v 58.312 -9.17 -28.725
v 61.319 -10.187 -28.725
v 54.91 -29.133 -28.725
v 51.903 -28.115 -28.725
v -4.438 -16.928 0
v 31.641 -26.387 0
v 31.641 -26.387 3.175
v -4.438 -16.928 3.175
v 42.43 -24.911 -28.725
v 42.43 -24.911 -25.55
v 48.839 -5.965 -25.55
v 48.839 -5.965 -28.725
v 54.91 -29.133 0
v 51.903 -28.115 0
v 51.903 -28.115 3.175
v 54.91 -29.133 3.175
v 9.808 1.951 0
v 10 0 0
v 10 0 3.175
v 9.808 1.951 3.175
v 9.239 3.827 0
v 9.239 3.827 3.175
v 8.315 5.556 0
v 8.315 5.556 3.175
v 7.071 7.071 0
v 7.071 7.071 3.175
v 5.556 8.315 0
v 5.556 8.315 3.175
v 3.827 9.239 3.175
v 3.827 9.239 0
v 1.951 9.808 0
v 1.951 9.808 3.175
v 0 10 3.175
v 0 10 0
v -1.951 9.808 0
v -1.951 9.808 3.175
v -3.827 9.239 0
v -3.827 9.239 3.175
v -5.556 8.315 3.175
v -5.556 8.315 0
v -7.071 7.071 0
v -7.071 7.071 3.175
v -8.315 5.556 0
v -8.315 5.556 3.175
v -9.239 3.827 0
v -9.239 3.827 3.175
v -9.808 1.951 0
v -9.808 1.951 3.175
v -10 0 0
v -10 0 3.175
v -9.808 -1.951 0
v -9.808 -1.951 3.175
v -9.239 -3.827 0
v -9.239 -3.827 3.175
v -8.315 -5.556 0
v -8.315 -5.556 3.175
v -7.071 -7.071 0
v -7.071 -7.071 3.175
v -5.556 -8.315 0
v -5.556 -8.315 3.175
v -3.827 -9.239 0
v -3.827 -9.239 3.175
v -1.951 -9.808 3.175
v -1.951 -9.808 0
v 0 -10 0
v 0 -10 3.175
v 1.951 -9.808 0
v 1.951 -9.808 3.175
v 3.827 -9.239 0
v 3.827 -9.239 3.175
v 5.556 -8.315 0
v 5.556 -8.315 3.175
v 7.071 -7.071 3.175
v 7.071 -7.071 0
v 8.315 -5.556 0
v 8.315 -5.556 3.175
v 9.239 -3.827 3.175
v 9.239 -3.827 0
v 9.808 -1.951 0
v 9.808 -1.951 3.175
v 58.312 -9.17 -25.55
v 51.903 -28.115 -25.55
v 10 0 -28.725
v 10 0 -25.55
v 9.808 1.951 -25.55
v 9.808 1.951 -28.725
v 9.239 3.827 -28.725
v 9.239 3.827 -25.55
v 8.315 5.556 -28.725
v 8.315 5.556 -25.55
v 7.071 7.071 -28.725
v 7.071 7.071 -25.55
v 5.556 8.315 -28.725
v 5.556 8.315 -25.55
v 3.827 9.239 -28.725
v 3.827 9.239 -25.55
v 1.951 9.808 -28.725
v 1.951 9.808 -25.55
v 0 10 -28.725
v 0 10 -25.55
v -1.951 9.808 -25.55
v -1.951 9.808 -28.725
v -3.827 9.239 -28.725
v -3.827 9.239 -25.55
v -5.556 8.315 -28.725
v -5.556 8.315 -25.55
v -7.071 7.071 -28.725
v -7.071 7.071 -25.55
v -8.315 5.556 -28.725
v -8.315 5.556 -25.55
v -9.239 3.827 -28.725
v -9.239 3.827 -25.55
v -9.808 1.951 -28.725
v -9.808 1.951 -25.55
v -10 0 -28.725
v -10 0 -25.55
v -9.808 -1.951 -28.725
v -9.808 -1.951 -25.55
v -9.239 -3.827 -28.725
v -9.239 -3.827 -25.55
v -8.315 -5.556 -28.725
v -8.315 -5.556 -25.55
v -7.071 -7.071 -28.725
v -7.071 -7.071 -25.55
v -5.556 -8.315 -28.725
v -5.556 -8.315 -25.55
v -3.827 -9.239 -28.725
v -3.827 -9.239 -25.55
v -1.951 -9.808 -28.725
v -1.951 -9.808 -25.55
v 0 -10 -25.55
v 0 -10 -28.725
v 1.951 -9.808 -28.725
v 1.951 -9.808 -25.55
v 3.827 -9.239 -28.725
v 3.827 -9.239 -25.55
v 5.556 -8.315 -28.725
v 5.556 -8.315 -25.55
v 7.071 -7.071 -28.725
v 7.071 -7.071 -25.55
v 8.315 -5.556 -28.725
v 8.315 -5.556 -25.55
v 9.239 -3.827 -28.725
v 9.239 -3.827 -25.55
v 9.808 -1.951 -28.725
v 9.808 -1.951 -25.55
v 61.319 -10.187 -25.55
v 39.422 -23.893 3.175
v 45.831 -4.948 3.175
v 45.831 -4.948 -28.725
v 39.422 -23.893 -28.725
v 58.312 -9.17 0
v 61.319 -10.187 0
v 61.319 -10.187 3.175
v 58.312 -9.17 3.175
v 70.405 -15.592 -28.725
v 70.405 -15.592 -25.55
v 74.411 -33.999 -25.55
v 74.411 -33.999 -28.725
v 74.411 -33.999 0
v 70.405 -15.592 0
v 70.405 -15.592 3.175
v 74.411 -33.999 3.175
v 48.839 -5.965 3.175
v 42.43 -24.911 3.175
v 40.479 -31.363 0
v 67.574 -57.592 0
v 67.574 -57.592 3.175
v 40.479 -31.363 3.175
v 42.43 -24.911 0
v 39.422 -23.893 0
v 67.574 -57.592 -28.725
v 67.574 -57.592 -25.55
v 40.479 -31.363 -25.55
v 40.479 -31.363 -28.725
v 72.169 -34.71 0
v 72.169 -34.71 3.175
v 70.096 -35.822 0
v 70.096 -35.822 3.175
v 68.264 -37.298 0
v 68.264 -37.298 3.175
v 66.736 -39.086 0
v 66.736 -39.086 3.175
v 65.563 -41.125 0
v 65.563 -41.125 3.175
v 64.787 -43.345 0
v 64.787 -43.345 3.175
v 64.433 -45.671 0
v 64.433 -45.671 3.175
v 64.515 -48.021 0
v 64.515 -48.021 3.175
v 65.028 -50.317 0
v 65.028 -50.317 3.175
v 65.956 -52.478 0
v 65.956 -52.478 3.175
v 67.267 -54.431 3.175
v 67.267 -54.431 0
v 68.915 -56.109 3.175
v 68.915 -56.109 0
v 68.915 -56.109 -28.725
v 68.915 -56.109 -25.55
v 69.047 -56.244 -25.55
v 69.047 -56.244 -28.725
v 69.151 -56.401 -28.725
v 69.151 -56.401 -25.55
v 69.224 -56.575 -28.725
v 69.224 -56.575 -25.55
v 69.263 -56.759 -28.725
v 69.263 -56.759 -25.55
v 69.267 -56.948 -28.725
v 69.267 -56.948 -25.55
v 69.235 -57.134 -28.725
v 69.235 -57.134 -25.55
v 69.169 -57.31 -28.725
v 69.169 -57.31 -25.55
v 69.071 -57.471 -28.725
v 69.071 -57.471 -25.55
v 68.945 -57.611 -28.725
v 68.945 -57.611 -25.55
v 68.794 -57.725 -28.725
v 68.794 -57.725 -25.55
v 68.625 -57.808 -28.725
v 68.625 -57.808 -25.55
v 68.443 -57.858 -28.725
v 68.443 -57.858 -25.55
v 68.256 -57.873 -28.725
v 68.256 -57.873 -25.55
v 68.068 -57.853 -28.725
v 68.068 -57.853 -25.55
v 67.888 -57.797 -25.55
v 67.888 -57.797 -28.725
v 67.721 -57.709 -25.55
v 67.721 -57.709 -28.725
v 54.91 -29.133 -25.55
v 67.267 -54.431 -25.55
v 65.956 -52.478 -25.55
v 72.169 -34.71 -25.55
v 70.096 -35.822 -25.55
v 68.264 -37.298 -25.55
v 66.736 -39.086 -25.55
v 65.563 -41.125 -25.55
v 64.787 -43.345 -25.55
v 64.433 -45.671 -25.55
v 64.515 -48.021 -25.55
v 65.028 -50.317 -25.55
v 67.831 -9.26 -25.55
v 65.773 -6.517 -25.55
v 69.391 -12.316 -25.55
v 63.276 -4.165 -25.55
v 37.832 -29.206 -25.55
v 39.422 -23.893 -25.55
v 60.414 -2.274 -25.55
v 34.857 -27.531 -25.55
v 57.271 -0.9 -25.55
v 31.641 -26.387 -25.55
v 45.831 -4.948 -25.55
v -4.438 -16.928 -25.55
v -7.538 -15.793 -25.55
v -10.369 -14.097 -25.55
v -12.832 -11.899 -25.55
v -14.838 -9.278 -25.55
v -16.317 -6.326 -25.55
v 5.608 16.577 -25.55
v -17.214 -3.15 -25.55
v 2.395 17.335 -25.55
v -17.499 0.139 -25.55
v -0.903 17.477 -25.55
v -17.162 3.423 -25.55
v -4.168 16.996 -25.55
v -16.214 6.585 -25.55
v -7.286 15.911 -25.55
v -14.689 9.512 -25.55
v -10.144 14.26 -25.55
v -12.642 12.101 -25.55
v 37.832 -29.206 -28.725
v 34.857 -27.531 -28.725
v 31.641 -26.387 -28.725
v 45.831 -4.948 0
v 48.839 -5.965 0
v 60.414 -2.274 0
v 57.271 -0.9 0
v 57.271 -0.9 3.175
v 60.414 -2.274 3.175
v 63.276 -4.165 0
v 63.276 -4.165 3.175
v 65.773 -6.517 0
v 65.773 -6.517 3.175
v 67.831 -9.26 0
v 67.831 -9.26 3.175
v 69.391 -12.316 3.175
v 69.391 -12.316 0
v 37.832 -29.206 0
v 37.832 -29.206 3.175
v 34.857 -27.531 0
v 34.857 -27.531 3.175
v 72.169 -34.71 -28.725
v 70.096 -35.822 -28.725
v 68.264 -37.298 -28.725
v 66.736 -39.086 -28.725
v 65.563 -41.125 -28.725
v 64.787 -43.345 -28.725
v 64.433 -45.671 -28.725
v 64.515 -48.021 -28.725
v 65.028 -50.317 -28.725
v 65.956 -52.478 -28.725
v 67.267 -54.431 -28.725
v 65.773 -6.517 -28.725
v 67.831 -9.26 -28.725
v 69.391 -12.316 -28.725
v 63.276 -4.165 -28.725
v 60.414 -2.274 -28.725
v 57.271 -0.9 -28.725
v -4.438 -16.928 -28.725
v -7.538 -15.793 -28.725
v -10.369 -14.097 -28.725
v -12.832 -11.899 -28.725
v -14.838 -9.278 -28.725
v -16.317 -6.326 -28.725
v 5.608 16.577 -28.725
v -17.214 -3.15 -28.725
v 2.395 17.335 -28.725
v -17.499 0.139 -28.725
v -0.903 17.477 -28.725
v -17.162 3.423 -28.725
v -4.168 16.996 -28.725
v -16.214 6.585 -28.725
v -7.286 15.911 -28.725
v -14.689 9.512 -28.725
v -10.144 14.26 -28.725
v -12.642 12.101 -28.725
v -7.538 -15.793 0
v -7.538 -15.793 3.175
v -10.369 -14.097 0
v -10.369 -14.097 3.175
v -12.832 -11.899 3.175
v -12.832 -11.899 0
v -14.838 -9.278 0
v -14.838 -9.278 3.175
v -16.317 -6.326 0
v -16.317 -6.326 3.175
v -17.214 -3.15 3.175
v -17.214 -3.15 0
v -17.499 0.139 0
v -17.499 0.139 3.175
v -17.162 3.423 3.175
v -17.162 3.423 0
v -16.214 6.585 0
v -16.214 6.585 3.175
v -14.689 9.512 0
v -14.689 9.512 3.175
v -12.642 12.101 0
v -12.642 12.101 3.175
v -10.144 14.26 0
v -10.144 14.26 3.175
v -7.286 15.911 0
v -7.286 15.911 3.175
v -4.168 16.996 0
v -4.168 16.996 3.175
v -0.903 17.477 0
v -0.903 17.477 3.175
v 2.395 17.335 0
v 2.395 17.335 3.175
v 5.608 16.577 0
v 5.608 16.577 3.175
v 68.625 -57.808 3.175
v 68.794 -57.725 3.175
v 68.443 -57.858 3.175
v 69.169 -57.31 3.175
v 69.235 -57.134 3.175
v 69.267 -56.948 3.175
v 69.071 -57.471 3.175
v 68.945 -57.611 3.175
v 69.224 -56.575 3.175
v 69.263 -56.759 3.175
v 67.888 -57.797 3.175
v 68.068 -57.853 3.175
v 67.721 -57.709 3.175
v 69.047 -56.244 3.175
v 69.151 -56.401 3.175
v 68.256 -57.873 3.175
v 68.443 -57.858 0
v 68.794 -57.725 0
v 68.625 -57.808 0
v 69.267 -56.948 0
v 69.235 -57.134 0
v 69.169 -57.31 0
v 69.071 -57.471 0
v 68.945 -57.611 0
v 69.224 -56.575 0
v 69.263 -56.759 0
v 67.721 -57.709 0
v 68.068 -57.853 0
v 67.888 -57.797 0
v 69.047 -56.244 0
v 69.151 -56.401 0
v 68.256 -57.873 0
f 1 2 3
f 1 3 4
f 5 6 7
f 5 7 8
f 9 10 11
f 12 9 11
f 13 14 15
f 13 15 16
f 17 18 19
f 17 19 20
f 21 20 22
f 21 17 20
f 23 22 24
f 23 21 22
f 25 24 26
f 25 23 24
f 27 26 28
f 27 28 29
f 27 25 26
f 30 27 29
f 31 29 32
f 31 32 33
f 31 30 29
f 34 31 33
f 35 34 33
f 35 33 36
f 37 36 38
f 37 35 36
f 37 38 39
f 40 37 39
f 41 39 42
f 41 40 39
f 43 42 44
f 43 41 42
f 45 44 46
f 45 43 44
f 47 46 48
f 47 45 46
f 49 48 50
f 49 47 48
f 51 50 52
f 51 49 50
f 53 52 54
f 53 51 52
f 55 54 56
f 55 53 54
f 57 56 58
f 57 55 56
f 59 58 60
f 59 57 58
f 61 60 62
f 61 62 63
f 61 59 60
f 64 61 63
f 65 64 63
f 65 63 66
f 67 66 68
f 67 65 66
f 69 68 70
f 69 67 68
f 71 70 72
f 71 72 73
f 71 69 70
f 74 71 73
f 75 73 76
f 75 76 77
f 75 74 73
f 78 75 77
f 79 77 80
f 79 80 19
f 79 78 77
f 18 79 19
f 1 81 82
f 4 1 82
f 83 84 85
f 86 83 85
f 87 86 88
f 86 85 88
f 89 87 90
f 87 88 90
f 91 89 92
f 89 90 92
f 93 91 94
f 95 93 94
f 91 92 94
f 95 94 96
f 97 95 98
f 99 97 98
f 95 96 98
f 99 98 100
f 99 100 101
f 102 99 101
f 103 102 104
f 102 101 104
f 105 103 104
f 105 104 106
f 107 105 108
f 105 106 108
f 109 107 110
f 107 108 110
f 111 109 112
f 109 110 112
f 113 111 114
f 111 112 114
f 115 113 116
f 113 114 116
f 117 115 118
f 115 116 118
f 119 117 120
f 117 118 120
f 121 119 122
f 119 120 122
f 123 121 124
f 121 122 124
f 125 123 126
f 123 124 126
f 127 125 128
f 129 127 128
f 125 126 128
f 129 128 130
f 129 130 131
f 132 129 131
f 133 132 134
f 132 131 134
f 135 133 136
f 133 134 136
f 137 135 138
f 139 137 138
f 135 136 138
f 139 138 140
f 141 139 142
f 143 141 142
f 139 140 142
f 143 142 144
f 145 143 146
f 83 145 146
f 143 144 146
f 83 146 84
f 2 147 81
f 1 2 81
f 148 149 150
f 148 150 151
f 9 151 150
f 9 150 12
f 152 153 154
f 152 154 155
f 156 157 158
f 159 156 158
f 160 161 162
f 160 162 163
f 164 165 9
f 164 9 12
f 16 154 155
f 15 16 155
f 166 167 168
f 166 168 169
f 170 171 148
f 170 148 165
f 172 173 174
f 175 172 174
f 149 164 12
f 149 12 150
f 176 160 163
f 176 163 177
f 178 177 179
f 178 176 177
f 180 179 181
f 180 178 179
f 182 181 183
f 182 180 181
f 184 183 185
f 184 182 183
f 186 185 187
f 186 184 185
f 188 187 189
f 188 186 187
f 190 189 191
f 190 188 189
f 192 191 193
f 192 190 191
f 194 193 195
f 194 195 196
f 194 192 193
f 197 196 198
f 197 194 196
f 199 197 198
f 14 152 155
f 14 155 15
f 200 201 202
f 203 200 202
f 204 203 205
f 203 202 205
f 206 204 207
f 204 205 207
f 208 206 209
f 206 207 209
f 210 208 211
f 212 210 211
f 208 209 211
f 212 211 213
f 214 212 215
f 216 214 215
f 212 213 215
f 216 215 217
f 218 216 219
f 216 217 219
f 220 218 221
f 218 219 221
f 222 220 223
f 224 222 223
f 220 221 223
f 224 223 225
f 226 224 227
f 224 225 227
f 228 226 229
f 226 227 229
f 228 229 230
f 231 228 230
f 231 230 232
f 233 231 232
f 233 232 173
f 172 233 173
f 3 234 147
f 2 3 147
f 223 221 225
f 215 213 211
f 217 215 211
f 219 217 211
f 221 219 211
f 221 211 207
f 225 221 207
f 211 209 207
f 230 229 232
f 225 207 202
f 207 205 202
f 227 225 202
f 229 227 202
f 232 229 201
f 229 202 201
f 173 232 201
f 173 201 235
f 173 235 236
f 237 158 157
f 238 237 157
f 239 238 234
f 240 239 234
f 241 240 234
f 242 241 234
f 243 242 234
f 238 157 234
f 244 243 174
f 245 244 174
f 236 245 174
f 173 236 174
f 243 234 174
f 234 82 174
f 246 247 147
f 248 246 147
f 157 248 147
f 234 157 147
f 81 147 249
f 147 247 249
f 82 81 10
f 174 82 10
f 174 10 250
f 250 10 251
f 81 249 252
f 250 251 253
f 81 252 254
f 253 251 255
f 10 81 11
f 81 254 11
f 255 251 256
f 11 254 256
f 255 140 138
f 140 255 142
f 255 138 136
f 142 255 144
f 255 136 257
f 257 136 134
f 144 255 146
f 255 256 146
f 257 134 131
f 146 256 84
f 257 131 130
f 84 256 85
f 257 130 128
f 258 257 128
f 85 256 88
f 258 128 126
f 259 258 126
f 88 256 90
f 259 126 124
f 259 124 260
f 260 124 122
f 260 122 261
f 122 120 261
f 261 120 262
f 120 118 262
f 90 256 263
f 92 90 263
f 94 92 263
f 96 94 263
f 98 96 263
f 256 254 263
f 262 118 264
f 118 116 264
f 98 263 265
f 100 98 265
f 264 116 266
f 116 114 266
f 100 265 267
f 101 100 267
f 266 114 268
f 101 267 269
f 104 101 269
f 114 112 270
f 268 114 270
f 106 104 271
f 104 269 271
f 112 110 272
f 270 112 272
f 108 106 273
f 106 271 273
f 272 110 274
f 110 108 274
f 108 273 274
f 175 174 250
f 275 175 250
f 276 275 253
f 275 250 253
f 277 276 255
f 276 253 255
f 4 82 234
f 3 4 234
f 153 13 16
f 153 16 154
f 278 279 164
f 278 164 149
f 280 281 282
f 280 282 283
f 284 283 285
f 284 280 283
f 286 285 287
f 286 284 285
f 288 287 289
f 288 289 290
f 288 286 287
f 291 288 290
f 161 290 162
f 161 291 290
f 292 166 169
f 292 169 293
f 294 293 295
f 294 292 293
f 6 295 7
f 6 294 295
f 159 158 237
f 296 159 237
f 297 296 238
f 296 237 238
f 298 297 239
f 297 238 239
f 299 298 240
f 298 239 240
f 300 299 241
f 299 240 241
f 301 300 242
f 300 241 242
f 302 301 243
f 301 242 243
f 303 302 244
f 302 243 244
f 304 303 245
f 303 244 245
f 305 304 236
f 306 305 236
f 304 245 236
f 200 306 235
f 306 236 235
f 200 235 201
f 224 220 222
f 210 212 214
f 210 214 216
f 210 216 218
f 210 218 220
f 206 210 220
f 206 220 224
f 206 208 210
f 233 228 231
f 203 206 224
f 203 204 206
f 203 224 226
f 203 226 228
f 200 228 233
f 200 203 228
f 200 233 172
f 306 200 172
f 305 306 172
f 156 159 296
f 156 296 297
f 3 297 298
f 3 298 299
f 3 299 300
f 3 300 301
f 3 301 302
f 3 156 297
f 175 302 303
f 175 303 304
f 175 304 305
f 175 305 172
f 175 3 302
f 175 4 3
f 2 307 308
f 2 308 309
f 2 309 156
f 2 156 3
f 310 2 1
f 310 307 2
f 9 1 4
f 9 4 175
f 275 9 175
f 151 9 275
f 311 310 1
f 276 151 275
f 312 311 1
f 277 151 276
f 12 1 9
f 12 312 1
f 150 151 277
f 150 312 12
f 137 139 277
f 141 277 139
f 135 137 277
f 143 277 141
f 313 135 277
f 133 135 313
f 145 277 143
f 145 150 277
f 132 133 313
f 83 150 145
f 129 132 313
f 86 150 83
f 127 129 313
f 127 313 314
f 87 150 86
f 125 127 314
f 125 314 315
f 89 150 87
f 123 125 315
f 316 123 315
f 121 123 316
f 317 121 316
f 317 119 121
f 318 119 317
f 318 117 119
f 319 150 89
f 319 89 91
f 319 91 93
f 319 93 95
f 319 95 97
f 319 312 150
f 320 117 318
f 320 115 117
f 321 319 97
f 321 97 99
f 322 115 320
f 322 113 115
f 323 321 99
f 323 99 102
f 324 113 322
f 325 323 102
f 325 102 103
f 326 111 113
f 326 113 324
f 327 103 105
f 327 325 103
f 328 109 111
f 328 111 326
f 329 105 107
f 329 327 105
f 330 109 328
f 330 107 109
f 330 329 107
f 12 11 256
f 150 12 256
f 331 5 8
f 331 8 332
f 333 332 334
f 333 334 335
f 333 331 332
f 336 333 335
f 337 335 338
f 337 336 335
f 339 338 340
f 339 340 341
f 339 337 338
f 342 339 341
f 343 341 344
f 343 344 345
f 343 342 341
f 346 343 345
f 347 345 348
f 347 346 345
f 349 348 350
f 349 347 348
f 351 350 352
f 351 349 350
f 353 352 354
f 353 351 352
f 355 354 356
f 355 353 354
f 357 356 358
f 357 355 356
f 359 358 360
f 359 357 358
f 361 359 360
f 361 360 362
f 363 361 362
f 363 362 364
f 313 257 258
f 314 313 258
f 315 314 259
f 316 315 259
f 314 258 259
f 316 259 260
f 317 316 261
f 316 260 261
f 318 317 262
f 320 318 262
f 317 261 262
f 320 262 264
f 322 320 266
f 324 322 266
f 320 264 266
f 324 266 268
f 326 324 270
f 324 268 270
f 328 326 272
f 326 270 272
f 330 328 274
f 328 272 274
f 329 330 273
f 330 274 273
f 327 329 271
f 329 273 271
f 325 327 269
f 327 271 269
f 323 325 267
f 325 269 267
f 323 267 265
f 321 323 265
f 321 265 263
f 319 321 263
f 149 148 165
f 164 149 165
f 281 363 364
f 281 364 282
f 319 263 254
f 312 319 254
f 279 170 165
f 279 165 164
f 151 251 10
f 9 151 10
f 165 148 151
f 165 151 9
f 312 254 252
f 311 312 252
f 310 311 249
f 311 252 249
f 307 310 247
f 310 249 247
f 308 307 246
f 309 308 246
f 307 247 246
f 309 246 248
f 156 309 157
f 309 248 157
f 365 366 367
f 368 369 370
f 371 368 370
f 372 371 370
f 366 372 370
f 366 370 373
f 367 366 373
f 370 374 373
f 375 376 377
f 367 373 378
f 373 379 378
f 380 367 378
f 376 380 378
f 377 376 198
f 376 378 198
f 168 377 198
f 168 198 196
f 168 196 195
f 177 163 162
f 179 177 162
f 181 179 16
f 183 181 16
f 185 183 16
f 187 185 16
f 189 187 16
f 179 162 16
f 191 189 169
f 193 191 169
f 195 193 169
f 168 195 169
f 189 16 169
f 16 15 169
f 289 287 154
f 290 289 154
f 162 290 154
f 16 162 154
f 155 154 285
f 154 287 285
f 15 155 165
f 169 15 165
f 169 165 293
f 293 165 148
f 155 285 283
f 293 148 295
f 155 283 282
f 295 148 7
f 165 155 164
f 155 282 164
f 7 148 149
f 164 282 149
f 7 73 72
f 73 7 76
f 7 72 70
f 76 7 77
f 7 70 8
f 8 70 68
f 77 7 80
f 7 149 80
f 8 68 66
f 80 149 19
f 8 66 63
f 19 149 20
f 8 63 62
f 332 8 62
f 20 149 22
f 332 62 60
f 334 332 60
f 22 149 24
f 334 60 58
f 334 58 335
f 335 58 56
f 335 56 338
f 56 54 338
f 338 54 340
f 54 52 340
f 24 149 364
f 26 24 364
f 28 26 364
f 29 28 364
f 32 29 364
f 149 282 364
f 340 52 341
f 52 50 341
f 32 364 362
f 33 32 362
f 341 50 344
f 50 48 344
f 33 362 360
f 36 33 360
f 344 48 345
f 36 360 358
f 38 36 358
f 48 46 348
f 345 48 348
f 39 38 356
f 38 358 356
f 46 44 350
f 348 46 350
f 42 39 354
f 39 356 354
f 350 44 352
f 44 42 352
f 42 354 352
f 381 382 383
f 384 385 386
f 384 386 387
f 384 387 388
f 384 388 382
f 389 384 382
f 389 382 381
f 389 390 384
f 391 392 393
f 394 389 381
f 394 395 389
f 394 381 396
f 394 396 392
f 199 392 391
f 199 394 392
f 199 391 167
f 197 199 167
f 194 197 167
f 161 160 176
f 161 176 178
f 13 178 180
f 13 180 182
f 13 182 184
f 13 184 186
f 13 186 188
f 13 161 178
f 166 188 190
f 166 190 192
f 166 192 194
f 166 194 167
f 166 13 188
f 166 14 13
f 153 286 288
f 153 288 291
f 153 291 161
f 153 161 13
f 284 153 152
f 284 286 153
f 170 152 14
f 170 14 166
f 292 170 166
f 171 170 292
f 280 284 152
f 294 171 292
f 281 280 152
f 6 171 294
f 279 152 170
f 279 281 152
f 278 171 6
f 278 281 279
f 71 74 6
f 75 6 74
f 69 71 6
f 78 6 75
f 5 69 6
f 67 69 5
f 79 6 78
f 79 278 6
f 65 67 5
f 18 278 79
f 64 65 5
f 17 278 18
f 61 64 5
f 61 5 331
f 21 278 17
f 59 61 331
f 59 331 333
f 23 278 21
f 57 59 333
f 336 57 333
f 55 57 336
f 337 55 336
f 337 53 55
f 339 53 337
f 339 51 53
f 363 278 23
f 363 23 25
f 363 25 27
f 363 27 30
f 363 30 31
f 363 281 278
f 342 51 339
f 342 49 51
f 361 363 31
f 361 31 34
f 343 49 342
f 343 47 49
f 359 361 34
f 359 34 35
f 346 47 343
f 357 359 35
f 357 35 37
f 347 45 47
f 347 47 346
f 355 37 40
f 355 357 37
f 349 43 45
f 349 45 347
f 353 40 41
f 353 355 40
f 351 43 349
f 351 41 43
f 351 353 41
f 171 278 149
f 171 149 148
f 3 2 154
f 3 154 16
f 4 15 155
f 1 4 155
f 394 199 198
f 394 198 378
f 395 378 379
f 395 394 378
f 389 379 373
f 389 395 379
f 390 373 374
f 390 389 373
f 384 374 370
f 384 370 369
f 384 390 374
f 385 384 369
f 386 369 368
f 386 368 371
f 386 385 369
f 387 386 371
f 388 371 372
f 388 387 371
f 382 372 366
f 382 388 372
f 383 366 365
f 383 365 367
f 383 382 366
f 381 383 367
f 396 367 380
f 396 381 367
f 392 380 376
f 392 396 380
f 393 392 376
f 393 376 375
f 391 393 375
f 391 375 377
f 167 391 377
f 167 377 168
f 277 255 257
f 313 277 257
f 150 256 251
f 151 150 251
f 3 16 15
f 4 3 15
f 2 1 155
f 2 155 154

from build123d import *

# Parameters (mm, degrees)
SKETCH1_R             = 10
BOSS_EXTRUDE1_DEPTH   = 3.175
BOSS_EXTRUDE2_DEPTH   = 31.9
BOSS_EXTRUDE2_2_DEPTH = 31.9


with BuildPart() as part:
    # Sketch1 → Boss-Extrude1 (new body)
    with BuildSketch(Plane.XY):
        with BuildLine():
            Line((5.607971528, 16.577112395), (57.271414282, -0.900425857))
            ThreePointArc((57.271414282, -0.900425857), (65.773207032, -6.516594805), (70.404806539, -15.592393373))
            Line((70.404806539, -15.592393373), (74.410944882, -33.999253713))
            ThreePointArc((74.410944882, -33.999253713), (64.786854385, -43.345102314), (68.914977689, -56.109372837))
            ThreePointArc((68.914977689, -56.109372837), (69.011144361, -57.544060684), (67.574026379, -57.591696317))
            Line((67.574026379, -57.591696317), (40.479288713, -31.362848764))
            ThreePointArc((40.479288713, -31.362848764), (36.380649999, -28.305047462), (31.640575479, -26.386537192))
            Line((31.640575479, -26.386537192), (-4.437949885, -16.927923701))
            ThreePointArc((-4.437949885, -16.927923701), (-16.76272945, 5.026022423), (5.607971528, 16.577112395))
        make_face()
        Circle(SKETCH1_R, mode=Mode.SUBTRACT)
        Polygon((58.311613076, -9.169863981), (51.902502759, -28.115135289), (54.910064579, -29.132581552), (61.319174897, -10.187310244), align=None, mode=Mode.SUBTRACT)
        Polygon((45.831415602, -4.94786256), (39.422305285, -23.893133868), (42.429867105, -24.910580131), (48.838977422, -5.965308822), align=None, mode=Mode.SUBTRACT)
    extrude(amount=BOSS_EXTRUDE1_DEPTH)


with BuildPart() as body_2:
    # Mirror3: mirrored copy
    add(part.part.mirror(Plane(origin=(0, 0, -12.775), x_dir=(1, 0, 0), z_dir=(0, 0, -1))))


with BuildPart() as body_3:
    # Sketch2 → Boss-Extrude2 (new body)
    with BuildSketch(Plane.XY.offset(3.175)):
        Polygon((45.831415602, -4.94786256), (39.422305285, -23.893133868), (42.429867105, -24.910580131), (48.838977422, -5.965308822), align=None)
    extrude(amount=-BOSS_EXTRUDE2_DEPTH)


with BuildPart() as body_4:
    # Sketch2 → Boss-Extrude2 2 (new body)
    with BuildSketch(Plane.XY.offset(3.175)):
        Polygon((51.902502759, -28.115135289), (58.311613076, -9.169863981), (61.319174897, -10.187310244), (54.910064579, -29.132581552), align=None)
    extrude(amount=-BOSS_EXTRUDE2_2_DEPTH)


solid = Compound([part.part, body_2.part, body_3.part, body_4.part])
